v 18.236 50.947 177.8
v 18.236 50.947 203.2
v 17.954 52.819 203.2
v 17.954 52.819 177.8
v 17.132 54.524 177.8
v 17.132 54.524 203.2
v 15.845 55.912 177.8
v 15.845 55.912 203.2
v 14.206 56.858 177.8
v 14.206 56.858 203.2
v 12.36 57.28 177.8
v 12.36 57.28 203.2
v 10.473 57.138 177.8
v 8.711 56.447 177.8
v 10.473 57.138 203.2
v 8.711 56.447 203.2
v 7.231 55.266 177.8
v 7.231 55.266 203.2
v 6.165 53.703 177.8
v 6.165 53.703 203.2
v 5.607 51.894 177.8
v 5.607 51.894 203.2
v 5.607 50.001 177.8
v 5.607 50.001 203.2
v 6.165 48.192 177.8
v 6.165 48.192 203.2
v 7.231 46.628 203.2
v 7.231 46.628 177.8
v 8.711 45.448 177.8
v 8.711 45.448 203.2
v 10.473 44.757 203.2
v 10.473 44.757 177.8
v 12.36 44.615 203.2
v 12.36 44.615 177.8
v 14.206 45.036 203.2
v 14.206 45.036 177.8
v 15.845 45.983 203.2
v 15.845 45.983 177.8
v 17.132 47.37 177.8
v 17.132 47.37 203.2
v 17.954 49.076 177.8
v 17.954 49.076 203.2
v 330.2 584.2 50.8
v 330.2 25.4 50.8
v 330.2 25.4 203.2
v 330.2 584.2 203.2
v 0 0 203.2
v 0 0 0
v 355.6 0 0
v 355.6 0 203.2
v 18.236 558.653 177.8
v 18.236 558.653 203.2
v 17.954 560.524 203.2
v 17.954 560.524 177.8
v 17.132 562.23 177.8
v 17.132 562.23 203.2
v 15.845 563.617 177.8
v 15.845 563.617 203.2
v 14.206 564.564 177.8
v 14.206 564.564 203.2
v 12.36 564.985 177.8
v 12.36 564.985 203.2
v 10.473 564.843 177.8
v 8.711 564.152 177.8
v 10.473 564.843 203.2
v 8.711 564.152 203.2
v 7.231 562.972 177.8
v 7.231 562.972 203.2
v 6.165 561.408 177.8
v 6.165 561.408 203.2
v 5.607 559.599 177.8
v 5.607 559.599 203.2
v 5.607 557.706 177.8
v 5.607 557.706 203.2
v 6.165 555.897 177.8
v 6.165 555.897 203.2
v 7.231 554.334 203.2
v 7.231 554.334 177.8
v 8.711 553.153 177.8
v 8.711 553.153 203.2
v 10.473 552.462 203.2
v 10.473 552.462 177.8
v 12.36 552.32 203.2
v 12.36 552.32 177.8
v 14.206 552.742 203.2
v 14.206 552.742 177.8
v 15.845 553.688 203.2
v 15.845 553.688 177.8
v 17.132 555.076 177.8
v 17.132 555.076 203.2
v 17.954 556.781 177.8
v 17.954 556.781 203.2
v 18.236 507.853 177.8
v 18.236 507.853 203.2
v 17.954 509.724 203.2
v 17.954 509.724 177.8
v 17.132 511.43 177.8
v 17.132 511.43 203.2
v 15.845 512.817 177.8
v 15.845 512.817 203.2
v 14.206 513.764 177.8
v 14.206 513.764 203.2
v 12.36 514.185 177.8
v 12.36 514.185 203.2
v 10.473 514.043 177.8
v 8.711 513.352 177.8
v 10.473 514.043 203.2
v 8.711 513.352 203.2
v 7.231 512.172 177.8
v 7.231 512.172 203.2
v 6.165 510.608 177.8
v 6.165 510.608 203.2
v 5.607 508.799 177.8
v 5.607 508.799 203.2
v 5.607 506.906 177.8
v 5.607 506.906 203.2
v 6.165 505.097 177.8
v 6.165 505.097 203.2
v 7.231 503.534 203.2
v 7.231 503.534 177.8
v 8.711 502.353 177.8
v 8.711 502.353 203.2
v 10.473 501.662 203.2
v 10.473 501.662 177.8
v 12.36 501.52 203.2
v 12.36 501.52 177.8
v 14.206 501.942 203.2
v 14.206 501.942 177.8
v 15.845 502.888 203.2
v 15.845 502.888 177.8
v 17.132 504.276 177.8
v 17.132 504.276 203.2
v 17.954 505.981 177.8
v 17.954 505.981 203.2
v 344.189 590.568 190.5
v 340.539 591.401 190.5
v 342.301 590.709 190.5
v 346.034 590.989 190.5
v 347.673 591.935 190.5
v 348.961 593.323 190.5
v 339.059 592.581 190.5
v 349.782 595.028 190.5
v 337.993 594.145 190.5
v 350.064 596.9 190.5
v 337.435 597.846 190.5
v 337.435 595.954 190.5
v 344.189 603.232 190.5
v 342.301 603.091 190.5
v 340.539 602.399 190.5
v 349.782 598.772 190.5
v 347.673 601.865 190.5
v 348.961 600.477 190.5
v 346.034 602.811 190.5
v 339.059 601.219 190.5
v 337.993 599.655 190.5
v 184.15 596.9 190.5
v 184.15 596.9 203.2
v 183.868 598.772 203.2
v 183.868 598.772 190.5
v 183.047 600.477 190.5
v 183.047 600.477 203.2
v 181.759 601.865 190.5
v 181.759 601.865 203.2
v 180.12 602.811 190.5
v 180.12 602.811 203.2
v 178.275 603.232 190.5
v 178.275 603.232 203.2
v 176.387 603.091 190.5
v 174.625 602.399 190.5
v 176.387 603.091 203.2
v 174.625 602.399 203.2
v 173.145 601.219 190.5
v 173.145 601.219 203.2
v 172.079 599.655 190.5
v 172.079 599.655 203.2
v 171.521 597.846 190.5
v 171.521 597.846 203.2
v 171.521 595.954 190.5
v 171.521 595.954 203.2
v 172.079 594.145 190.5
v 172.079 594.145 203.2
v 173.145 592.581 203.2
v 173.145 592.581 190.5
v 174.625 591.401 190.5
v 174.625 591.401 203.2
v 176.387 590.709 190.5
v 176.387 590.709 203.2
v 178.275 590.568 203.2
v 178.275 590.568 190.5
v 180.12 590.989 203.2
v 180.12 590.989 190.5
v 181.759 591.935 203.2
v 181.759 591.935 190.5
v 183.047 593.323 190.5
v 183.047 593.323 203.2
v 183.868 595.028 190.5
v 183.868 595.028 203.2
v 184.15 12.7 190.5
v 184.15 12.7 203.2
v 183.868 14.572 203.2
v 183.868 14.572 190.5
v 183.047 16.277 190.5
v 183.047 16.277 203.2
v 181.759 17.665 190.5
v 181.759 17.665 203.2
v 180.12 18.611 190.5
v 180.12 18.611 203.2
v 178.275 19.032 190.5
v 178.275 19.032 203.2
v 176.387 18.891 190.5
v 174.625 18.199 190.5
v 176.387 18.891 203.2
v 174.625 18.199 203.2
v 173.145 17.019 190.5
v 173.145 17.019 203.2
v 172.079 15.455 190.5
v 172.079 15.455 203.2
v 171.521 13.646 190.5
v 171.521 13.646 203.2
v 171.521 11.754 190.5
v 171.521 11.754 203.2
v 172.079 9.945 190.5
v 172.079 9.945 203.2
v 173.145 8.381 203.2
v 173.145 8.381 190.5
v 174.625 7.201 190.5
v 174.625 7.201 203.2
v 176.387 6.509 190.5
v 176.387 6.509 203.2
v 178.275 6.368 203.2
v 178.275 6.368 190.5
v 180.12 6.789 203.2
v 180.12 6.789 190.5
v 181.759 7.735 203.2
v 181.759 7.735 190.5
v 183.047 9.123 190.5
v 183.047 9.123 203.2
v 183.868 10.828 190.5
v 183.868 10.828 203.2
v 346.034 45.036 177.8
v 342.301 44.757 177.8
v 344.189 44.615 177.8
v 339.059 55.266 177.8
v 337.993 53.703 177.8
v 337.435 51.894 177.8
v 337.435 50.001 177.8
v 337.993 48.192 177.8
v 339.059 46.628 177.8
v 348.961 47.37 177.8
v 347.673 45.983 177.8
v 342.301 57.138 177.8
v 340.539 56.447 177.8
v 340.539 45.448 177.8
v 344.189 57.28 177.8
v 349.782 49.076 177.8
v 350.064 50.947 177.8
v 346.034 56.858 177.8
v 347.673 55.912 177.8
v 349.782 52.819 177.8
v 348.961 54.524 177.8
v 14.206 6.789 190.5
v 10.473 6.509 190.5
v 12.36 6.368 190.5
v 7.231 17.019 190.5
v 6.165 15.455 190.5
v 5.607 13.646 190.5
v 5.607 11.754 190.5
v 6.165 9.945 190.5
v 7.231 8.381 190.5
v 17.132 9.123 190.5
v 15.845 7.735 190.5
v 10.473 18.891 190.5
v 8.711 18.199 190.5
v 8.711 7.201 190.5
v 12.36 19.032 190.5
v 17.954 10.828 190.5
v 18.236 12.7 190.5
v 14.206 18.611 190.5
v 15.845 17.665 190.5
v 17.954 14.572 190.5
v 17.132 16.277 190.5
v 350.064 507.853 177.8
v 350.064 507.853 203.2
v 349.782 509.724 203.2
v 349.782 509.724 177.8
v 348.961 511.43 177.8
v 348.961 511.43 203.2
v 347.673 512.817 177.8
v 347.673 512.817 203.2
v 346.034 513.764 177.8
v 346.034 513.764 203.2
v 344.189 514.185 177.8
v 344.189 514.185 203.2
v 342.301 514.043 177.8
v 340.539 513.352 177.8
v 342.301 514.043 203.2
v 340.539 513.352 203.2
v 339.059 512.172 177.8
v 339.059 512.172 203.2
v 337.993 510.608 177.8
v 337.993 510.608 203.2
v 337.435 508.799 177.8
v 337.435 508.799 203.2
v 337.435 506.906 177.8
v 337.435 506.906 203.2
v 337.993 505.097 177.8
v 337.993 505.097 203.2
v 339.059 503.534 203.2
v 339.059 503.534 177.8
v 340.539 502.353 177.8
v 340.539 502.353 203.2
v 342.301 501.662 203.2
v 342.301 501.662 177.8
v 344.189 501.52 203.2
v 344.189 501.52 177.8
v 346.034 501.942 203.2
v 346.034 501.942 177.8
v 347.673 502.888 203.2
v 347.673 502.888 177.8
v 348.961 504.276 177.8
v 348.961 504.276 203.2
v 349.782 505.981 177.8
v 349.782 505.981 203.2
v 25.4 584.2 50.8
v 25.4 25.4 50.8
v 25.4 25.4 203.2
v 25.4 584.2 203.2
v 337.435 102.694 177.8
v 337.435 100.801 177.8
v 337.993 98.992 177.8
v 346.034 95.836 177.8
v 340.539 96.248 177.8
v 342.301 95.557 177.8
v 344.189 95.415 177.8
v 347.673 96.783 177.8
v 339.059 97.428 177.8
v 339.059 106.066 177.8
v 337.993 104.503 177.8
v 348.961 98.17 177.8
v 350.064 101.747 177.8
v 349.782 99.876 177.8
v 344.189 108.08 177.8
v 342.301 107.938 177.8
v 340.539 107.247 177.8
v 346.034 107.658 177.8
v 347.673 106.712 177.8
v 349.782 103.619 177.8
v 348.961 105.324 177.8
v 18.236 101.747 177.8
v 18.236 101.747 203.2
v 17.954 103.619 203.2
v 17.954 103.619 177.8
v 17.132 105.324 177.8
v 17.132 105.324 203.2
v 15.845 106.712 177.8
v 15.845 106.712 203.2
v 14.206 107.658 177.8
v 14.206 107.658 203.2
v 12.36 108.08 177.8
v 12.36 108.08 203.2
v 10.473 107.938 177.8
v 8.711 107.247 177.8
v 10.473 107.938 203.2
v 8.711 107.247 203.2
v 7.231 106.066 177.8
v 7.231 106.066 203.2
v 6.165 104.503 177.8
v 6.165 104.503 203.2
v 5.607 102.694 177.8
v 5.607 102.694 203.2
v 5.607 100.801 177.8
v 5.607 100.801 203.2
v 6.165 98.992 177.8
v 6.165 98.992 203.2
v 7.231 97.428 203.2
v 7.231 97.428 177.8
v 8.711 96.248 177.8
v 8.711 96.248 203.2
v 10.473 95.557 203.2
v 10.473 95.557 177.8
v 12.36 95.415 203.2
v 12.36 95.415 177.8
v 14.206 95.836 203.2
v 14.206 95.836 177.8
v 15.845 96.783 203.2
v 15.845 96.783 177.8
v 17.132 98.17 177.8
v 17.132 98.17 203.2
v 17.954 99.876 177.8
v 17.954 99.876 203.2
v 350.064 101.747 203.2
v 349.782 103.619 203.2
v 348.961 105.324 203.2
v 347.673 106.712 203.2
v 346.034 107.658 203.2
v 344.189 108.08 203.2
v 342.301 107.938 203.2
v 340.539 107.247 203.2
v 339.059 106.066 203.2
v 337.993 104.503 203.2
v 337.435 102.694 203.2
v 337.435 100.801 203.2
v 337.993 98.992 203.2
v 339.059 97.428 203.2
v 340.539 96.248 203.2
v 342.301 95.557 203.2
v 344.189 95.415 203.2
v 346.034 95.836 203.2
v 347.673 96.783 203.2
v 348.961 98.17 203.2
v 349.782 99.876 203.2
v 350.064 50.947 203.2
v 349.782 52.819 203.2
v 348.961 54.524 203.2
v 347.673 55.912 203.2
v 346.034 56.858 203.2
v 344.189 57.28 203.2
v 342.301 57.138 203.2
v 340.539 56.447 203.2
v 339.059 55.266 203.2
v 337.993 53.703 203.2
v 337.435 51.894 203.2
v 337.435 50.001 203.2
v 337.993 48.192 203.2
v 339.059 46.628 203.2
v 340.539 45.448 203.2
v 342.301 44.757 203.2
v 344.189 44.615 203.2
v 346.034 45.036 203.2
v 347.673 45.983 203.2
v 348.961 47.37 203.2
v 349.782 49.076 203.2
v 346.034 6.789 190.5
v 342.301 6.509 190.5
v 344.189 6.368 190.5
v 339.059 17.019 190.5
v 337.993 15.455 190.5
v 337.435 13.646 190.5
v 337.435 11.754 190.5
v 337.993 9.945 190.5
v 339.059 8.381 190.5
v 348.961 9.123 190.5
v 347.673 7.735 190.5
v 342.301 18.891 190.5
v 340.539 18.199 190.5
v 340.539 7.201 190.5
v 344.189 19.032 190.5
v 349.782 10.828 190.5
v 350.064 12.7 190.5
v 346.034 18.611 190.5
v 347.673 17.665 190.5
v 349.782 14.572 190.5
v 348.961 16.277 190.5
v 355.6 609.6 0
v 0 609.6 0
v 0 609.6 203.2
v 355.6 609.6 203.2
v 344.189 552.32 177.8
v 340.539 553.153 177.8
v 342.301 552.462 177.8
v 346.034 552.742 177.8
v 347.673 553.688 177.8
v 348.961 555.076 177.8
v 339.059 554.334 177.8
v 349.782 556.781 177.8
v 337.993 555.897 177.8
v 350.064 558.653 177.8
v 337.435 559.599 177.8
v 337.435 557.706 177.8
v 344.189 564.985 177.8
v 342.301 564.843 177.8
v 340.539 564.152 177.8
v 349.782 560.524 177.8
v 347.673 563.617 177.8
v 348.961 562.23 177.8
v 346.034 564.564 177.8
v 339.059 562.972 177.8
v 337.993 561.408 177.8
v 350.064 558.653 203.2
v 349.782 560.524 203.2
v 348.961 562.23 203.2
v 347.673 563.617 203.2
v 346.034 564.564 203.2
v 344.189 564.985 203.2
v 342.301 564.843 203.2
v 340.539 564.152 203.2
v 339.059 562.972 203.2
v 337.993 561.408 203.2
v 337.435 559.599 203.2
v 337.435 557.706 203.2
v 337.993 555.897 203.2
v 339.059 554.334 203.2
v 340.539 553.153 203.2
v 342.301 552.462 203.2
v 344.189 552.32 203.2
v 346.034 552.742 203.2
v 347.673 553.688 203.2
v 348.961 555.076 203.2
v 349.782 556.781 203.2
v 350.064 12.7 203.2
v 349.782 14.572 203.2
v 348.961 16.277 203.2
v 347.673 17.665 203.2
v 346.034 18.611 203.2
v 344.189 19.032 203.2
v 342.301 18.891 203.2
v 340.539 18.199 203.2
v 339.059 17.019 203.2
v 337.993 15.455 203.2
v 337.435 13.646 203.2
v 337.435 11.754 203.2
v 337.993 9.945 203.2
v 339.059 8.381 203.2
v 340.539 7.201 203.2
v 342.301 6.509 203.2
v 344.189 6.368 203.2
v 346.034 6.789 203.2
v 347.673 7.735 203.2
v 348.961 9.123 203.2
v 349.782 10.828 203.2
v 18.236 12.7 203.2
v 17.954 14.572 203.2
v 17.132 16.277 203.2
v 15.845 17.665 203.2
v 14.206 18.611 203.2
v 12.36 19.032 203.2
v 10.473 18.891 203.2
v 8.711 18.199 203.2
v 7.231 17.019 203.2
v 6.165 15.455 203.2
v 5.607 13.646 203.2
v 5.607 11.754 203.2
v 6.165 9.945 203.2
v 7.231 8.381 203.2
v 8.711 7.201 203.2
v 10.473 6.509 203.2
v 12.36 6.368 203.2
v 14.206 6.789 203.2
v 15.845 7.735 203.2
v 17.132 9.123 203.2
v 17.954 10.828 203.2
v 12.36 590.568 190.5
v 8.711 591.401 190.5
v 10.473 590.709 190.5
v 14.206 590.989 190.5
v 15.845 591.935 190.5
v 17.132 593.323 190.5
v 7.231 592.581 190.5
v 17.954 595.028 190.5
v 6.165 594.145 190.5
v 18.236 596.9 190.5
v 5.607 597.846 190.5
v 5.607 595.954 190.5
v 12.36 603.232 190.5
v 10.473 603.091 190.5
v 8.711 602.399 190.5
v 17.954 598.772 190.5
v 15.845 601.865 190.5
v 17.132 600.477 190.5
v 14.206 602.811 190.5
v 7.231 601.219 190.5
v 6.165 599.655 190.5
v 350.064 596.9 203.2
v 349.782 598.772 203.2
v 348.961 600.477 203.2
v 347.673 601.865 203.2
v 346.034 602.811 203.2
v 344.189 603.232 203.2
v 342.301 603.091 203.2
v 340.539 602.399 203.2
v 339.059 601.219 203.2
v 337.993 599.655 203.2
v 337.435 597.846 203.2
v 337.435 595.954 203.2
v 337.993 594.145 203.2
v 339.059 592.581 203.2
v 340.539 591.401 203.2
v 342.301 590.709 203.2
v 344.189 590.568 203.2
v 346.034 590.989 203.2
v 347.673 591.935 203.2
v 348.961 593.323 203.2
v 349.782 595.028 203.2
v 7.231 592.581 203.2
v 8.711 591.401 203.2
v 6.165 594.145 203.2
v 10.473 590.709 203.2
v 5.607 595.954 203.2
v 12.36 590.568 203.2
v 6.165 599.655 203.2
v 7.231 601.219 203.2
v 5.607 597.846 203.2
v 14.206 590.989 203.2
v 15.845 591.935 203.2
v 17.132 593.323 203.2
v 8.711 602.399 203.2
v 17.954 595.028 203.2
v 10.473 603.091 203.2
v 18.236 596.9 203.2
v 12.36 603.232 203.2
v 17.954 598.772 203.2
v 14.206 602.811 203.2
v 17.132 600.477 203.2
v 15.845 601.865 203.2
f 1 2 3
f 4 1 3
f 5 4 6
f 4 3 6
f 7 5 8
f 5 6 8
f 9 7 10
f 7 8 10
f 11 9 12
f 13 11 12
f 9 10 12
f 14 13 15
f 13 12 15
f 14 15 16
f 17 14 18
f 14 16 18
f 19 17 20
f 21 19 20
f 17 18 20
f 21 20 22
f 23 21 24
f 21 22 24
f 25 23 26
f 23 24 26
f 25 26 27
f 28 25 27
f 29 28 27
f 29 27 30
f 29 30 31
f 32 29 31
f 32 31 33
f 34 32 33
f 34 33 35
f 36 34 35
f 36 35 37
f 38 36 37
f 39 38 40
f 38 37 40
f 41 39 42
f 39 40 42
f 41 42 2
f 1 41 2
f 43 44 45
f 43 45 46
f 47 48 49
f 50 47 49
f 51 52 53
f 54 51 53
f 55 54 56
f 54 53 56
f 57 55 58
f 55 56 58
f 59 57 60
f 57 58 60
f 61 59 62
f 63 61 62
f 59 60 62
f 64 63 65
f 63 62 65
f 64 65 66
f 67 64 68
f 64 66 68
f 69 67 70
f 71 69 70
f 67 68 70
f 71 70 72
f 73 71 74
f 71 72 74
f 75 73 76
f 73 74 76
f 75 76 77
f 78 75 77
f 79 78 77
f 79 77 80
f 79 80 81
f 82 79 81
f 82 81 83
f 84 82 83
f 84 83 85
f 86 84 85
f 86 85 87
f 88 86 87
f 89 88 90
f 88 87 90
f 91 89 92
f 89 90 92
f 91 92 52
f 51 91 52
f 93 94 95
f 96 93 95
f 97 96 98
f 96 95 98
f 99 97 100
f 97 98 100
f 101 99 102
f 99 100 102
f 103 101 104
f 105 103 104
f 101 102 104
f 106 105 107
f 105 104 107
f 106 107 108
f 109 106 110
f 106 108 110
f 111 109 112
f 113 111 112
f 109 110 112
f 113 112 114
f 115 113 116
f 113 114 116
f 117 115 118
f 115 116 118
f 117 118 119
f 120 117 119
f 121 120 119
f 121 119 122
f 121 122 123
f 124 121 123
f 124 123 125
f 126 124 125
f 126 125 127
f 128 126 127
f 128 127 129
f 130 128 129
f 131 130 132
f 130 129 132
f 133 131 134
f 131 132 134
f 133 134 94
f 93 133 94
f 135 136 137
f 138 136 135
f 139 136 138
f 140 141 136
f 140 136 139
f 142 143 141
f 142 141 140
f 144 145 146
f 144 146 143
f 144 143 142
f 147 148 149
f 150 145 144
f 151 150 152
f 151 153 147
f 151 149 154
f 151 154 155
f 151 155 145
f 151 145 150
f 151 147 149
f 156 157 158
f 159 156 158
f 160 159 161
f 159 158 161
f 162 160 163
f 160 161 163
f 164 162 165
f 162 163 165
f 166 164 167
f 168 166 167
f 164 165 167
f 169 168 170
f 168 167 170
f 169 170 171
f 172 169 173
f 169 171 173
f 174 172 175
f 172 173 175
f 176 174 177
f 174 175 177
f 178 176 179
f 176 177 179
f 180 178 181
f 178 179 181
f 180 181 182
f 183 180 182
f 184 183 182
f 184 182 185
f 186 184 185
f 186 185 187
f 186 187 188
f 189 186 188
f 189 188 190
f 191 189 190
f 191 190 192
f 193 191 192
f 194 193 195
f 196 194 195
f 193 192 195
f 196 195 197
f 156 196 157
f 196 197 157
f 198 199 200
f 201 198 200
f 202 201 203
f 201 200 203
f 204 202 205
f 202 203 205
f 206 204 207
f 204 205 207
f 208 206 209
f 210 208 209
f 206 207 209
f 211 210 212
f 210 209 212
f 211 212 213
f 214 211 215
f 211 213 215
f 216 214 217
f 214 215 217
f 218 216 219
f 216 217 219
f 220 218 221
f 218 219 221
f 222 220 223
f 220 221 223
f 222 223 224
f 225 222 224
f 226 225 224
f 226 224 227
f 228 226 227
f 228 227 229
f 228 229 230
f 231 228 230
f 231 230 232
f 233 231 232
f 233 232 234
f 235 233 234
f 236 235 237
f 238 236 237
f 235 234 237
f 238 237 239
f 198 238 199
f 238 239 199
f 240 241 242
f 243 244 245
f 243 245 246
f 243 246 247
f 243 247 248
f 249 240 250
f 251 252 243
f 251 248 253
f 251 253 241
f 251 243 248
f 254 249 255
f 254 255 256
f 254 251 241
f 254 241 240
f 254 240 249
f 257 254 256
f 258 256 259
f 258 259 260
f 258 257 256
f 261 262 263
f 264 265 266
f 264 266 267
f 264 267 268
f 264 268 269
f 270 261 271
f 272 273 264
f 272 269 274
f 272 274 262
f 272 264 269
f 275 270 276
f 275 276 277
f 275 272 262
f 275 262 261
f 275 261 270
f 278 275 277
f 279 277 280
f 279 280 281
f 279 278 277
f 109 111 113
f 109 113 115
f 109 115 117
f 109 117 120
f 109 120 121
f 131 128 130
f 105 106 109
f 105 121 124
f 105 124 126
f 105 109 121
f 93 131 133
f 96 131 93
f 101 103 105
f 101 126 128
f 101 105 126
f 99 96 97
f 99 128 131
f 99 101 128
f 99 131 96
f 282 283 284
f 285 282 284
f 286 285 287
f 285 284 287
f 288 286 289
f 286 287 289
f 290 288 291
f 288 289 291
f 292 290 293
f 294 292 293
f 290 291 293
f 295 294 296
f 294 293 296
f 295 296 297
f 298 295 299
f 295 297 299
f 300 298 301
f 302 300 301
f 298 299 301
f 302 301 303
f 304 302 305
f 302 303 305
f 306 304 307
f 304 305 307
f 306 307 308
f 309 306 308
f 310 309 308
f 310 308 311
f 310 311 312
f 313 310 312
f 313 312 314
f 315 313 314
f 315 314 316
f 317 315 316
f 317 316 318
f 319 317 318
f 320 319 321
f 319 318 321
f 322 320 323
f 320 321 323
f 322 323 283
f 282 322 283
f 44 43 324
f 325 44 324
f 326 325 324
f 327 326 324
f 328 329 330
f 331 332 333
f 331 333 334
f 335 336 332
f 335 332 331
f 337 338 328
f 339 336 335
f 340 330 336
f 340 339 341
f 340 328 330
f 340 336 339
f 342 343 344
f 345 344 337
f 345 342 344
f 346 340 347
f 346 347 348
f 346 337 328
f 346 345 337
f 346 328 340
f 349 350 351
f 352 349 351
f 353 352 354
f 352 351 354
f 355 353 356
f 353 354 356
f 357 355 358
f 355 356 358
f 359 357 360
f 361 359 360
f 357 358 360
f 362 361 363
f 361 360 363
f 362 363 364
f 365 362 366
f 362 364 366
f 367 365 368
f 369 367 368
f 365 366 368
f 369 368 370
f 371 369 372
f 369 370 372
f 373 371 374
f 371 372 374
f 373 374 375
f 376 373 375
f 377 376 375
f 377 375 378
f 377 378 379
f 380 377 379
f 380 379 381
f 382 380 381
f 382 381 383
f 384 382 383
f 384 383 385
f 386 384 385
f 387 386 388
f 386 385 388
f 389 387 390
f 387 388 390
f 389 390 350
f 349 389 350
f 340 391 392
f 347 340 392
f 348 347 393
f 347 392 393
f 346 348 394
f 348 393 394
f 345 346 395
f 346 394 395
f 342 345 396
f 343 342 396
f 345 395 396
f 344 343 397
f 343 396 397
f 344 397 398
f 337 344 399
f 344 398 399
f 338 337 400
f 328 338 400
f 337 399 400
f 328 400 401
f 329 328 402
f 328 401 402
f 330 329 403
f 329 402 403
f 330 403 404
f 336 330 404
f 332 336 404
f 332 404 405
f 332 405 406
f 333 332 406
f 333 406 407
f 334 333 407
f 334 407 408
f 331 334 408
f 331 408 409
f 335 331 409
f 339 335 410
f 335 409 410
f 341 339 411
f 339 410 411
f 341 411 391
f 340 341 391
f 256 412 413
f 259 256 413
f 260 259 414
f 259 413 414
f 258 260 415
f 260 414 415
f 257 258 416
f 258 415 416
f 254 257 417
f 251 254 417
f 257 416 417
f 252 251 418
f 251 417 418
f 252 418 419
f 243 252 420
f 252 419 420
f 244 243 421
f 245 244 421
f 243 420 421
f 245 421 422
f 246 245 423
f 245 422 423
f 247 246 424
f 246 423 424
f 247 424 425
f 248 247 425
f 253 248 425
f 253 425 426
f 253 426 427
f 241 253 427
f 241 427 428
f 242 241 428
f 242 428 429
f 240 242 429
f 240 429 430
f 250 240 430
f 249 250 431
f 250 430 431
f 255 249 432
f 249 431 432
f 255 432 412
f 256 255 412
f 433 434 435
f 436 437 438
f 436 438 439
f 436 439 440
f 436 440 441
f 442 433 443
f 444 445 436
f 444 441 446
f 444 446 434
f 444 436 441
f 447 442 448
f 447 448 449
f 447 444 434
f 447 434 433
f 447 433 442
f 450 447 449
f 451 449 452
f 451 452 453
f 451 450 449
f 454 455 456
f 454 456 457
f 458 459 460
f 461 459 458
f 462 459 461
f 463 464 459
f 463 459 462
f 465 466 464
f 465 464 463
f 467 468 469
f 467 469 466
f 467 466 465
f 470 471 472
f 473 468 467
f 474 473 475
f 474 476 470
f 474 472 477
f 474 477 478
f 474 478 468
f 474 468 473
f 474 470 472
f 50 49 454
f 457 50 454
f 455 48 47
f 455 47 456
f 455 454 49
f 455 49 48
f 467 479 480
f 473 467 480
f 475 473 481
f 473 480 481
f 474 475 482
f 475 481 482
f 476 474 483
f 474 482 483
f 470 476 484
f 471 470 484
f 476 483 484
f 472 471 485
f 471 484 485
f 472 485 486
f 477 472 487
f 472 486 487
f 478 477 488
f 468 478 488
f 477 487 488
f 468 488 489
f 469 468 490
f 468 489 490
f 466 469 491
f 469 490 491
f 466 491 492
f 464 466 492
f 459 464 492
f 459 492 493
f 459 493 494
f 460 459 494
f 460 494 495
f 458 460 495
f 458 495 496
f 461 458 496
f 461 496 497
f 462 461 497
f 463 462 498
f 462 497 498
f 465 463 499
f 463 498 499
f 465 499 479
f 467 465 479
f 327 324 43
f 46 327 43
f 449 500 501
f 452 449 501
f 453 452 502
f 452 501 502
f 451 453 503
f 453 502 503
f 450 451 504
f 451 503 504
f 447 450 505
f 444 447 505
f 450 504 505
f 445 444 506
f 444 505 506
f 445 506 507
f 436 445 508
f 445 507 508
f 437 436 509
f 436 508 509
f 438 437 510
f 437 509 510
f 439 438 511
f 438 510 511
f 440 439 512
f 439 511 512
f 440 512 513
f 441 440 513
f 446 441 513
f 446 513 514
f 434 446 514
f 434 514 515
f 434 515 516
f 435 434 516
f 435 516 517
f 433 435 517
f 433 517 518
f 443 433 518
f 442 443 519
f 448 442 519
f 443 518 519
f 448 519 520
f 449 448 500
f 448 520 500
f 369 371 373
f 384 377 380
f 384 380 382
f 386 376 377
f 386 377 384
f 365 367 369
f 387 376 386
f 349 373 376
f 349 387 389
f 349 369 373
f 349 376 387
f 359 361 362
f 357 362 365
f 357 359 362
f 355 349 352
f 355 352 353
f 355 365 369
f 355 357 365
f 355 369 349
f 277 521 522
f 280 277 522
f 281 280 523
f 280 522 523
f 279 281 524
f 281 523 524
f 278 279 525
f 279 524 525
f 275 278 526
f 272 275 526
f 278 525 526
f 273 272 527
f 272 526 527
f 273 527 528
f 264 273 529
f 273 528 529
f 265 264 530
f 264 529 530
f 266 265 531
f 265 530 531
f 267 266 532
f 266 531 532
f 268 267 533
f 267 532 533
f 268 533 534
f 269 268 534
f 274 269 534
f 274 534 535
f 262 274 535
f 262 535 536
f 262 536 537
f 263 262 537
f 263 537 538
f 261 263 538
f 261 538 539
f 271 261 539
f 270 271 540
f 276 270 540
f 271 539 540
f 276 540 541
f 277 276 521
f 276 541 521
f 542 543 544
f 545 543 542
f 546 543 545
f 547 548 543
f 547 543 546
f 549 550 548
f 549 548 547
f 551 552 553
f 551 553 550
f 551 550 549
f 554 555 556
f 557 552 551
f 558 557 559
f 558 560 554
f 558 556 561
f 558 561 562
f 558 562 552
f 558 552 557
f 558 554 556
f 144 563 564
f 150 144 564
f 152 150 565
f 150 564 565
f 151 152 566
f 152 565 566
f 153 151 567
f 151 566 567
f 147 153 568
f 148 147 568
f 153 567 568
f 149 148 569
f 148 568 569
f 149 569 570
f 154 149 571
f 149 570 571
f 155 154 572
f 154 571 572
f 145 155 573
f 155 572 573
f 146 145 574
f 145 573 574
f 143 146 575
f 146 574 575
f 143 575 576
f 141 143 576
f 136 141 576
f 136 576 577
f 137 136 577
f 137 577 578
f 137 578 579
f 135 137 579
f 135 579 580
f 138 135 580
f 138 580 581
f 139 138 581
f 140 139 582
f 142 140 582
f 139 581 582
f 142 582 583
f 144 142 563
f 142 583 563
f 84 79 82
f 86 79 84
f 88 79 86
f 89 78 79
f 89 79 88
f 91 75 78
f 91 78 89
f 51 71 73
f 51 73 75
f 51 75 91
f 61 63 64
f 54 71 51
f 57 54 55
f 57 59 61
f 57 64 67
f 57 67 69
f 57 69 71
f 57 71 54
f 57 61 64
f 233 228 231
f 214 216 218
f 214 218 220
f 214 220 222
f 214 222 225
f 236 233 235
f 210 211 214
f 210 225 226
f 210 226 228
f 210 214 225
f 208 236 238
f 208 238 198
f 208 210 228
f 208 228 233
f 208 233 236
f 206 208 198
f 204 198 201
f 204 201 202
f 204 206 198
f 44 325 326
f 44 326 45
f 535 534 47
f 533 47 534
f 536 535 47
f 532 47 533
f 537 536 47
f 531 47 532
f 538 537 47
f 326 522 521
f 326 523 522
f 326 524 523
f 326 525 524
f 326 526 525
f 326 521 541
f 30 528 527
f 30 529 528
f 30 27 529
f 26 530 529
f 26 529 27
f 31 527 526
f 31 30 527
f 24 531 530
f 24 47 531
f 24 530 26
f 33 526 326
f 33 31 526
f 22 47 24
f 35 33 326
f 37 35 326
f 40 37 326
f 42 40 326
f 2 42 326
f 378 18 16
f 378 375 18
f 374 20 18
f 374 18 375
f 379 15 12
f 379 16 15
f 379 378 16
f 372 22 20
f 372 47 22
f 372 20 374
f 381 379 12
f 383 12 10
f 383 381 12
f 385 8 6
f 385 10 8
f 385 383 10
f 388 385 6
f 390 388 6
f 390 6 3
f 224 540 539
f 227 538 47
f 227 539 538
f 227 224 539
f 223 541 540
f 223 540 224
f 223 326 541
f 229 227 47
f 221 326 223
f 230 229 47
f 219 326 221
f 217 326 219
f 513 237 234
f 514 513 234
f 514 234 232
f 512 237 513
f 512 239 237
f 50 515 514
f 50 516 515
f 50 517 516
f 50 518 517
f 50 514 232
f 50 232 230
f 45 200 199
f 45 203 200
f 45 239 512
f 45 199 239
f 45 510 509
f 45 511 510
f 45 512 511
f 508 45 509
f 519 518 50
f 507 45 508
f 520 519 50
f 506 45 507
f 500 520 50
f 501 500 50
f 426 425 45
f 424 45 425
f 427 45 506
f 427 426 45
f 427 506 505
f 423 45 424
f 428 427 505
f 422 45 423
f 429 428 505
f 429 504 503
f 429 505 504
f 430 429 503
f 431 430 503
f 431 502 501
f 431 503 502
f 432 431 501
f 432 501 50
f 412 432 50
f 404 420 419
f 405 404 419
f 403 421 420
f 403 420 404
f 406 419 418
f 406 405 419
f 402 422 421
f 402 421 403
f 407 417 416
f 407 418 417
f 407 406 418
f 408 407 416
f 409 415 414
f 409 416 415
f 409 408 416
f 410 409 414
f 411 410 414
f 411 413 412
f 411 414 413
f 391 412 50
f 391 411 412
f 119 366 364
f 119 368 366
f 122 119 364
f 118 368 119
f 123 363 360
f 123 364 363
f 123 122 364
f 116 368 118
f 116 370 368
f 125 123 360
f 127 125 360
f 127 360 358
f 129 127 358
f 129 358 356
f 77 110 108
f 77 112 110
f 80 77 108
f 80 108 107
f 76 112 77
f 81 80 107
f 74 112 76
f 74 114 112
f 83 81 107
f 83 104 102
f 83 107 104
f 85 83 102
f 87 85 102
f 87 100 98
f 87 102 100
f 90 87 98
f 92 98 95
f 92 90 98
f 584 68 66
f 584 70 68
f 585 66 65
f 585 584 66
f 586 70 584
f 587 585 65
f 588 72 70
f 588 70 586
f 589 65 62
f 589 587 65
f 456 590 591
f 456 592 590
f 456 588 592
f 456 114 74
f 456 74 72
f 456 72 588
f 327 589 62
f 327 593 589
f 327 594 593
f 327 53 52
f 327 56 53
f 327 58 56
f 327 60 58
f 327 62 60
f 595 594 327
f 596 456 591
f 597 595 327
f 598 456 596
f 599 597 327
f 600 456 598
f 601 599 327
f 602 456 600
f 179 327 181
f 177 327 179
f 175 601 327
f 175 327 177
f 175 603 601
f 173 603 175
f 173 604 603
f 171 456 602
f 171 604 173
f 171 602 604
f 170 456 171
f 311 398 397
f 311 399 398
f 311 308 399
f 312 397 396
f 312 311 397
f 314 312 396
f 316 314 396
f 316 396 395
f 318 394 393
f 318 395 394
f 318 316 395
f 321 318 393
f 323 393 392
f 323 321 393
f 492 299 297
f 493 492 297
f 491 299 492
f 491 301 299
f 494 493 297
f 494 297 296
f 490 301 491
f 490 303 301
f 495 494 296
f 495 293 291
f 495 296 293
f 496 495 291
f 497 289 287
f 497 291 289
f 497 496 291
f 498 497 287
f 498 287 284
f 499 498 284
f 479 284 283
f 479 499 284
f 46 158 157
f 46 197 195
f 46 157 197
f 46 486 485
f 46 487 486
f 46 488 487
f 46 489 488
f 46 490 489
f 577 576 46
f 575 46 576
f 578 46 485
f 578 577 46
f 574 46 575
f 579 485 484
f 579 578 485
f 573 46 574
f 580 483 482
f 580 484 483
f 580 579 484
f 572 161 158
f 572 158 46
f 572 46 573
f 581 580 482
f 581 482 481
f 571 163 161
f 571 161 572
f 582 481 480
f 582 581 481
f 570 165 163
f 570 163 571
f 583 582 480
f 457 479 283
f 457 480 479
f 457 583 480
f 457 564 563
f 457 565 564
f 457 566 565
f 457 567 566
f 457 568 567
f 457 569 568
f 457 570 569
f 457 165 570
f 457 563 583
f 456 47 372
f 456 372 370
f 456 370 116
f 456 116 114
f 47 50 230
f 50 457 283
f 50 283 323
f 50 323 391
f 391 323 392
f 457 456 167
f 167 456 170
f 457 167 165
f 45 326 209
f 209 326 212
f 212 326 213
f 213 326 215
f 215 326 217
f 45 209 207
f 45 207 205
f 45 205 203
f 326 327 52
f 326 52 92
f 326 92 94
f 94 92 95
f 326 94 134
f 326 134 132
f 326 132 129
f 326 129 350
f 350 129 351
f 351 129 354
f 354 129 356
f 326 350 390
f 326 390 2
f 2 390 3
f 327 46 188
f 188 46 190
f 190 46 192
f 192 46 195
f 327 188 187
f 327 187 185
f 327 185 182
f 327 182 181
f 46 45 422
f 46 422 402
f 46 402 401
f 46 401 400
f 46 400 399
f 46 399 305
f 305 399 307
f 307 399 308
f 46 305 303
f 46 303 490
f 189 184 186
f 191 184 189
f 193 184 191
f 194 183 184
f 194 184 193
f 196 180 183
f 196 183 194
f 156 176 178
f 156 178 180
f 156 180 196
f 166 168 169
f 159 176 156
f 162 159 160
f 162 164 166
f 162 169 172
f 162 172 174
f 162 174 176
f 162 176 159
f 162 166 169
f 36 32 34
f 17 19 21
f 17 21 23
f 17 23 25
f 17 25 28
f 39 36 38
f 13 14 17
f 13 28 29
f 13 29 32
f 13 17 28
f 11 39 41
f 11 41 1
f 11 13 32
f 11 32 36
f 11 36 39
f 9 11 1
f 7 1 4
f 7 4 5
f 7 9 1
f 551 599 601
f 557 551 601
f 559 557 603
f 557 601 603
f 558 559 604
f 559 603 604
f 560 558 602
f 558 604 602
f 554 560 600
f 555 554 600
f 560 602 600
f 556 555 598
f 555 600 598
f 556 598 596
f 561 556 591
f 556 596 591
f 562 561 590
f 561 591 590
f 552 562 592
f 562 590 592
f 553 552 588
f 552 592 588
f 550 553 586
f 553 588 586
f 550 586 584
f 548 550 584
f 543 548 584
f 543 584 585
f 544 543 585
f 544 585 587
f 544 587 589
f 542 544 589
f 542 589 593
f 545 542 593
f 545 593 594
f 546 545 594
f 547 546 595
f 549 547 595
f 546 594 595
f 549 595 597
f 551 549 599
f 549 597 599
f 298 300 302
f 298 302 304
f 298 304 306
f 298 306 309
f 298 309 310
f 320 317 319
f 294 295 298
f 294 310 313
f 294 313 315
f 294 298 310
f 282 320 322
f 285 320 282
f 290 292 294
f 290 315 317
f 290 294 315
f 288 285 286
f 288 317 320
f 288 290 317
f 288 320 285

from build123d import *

# Parameters (mm, degrees)
SKETCH1_W           = 355.6
SKETCH1_H           = 609.6
SKETCH1_W_2         = 304.8
SKETCH1_H_2         = 558.8
BOSS_EXTRUDE2_DEPTH = 203.2
SKETCH4_W           = 304.8
SKETCH4_H           = 558.8
BOSS_EXTRUDE3_DEPTH = 50.8
SKETCH5_R           = 6.35
CUT_EXTRUDE1_DEPTH  = 25.4
SKETCH6_R           = 6.35
CUT_EXTRUDE2_DEPTH  = 12.7


with BuildPart() as part:
    # Sketch1 → Boss-Extrude2 (new body)
    with BuildSketch(Plane.XY):
        with Locations((177.8, 304.8)):
            Rectangle(SKETCH1_W, SKETCH1_H)
        with Locations((177.8, 304.8)):
            Rectangle(SKETCH1_W_2, SKETCH1_H_2, mode=Mode.SUBTRACT)
    extrude(amount=BOSS_EXTRUDE2_DEPTH)

    # Sketch4 → Boss-Extrude3 (add)
    with BuildSketch(Plane(origin=(0, 0, 0), x_dir=(-1, 0, 0), z_dir=(0, 0, -1))):
        with Locations((-177.8, 304.8)):
            Rectangle(SKETCH4_W, SKETCH4_H)
    extrude(amount=-BOSS_EXTRUDE3_DEPTH)

    # Sketch5 → Cut-Extrude1 (cut)
    with BuildSketch(Plane.XY.offset(203.2)):
        with Locations((11.88567414, 50.947353246)):
            Circle(SKETCH5_R)
        with Locations((11.88567414, 101.747353246)):
            Circle(SKETCH5_R)
        with Locations((11.88567414, 507.852646754)):
            Circle(SKETCH5_R)
        with Locations((11.88567414, 558.652646754)):
            Circle(SKETCH5_R)
        with Locations((343.71432586, 50.947353246)):
            Circle(SKETCH5_R)
        with Locations((343.71432586, 101.747353246)):
            Circle(SKETCH5_R)
        with Locations((343.71432586, 558.652646754)):
            Circle(SKETCH5_R)
        with Locations((343.71432586, 507.852646754)):
            Circle(SKETCH5_R)
    extrude(amount=-CUT_EXTRUDE1_DEPTH, mode=Mode.SUBTRACT)

    # Sketch6 → Cut-Extrude2 (cut)
    with BuildSketch(Plane.XY.offset(203.2)):
        with Locations((343.71432586, 596.9)):
            Circle(SKETCH6_R)
        with Locations((177.8, 596.9)):
            Circle(SKETCH6_R)
        with Locations((11.88567414, 596.9)):
            Circle(SKETCH6_R)
        with Locations((343.71432586, 12.7)):
            Circle(SKETCH6_R)
        with Locations((177.8, 12.7)):
            Circle(SKETCH6_R)
        with Locations((11.88567414, 12.7)):
            Circle(SKETCH6_R)
    extrude(amount=-CUT_EXTRUDE2_DEPTH, mode=Mode.SUBTRACT)


solid = part.part
